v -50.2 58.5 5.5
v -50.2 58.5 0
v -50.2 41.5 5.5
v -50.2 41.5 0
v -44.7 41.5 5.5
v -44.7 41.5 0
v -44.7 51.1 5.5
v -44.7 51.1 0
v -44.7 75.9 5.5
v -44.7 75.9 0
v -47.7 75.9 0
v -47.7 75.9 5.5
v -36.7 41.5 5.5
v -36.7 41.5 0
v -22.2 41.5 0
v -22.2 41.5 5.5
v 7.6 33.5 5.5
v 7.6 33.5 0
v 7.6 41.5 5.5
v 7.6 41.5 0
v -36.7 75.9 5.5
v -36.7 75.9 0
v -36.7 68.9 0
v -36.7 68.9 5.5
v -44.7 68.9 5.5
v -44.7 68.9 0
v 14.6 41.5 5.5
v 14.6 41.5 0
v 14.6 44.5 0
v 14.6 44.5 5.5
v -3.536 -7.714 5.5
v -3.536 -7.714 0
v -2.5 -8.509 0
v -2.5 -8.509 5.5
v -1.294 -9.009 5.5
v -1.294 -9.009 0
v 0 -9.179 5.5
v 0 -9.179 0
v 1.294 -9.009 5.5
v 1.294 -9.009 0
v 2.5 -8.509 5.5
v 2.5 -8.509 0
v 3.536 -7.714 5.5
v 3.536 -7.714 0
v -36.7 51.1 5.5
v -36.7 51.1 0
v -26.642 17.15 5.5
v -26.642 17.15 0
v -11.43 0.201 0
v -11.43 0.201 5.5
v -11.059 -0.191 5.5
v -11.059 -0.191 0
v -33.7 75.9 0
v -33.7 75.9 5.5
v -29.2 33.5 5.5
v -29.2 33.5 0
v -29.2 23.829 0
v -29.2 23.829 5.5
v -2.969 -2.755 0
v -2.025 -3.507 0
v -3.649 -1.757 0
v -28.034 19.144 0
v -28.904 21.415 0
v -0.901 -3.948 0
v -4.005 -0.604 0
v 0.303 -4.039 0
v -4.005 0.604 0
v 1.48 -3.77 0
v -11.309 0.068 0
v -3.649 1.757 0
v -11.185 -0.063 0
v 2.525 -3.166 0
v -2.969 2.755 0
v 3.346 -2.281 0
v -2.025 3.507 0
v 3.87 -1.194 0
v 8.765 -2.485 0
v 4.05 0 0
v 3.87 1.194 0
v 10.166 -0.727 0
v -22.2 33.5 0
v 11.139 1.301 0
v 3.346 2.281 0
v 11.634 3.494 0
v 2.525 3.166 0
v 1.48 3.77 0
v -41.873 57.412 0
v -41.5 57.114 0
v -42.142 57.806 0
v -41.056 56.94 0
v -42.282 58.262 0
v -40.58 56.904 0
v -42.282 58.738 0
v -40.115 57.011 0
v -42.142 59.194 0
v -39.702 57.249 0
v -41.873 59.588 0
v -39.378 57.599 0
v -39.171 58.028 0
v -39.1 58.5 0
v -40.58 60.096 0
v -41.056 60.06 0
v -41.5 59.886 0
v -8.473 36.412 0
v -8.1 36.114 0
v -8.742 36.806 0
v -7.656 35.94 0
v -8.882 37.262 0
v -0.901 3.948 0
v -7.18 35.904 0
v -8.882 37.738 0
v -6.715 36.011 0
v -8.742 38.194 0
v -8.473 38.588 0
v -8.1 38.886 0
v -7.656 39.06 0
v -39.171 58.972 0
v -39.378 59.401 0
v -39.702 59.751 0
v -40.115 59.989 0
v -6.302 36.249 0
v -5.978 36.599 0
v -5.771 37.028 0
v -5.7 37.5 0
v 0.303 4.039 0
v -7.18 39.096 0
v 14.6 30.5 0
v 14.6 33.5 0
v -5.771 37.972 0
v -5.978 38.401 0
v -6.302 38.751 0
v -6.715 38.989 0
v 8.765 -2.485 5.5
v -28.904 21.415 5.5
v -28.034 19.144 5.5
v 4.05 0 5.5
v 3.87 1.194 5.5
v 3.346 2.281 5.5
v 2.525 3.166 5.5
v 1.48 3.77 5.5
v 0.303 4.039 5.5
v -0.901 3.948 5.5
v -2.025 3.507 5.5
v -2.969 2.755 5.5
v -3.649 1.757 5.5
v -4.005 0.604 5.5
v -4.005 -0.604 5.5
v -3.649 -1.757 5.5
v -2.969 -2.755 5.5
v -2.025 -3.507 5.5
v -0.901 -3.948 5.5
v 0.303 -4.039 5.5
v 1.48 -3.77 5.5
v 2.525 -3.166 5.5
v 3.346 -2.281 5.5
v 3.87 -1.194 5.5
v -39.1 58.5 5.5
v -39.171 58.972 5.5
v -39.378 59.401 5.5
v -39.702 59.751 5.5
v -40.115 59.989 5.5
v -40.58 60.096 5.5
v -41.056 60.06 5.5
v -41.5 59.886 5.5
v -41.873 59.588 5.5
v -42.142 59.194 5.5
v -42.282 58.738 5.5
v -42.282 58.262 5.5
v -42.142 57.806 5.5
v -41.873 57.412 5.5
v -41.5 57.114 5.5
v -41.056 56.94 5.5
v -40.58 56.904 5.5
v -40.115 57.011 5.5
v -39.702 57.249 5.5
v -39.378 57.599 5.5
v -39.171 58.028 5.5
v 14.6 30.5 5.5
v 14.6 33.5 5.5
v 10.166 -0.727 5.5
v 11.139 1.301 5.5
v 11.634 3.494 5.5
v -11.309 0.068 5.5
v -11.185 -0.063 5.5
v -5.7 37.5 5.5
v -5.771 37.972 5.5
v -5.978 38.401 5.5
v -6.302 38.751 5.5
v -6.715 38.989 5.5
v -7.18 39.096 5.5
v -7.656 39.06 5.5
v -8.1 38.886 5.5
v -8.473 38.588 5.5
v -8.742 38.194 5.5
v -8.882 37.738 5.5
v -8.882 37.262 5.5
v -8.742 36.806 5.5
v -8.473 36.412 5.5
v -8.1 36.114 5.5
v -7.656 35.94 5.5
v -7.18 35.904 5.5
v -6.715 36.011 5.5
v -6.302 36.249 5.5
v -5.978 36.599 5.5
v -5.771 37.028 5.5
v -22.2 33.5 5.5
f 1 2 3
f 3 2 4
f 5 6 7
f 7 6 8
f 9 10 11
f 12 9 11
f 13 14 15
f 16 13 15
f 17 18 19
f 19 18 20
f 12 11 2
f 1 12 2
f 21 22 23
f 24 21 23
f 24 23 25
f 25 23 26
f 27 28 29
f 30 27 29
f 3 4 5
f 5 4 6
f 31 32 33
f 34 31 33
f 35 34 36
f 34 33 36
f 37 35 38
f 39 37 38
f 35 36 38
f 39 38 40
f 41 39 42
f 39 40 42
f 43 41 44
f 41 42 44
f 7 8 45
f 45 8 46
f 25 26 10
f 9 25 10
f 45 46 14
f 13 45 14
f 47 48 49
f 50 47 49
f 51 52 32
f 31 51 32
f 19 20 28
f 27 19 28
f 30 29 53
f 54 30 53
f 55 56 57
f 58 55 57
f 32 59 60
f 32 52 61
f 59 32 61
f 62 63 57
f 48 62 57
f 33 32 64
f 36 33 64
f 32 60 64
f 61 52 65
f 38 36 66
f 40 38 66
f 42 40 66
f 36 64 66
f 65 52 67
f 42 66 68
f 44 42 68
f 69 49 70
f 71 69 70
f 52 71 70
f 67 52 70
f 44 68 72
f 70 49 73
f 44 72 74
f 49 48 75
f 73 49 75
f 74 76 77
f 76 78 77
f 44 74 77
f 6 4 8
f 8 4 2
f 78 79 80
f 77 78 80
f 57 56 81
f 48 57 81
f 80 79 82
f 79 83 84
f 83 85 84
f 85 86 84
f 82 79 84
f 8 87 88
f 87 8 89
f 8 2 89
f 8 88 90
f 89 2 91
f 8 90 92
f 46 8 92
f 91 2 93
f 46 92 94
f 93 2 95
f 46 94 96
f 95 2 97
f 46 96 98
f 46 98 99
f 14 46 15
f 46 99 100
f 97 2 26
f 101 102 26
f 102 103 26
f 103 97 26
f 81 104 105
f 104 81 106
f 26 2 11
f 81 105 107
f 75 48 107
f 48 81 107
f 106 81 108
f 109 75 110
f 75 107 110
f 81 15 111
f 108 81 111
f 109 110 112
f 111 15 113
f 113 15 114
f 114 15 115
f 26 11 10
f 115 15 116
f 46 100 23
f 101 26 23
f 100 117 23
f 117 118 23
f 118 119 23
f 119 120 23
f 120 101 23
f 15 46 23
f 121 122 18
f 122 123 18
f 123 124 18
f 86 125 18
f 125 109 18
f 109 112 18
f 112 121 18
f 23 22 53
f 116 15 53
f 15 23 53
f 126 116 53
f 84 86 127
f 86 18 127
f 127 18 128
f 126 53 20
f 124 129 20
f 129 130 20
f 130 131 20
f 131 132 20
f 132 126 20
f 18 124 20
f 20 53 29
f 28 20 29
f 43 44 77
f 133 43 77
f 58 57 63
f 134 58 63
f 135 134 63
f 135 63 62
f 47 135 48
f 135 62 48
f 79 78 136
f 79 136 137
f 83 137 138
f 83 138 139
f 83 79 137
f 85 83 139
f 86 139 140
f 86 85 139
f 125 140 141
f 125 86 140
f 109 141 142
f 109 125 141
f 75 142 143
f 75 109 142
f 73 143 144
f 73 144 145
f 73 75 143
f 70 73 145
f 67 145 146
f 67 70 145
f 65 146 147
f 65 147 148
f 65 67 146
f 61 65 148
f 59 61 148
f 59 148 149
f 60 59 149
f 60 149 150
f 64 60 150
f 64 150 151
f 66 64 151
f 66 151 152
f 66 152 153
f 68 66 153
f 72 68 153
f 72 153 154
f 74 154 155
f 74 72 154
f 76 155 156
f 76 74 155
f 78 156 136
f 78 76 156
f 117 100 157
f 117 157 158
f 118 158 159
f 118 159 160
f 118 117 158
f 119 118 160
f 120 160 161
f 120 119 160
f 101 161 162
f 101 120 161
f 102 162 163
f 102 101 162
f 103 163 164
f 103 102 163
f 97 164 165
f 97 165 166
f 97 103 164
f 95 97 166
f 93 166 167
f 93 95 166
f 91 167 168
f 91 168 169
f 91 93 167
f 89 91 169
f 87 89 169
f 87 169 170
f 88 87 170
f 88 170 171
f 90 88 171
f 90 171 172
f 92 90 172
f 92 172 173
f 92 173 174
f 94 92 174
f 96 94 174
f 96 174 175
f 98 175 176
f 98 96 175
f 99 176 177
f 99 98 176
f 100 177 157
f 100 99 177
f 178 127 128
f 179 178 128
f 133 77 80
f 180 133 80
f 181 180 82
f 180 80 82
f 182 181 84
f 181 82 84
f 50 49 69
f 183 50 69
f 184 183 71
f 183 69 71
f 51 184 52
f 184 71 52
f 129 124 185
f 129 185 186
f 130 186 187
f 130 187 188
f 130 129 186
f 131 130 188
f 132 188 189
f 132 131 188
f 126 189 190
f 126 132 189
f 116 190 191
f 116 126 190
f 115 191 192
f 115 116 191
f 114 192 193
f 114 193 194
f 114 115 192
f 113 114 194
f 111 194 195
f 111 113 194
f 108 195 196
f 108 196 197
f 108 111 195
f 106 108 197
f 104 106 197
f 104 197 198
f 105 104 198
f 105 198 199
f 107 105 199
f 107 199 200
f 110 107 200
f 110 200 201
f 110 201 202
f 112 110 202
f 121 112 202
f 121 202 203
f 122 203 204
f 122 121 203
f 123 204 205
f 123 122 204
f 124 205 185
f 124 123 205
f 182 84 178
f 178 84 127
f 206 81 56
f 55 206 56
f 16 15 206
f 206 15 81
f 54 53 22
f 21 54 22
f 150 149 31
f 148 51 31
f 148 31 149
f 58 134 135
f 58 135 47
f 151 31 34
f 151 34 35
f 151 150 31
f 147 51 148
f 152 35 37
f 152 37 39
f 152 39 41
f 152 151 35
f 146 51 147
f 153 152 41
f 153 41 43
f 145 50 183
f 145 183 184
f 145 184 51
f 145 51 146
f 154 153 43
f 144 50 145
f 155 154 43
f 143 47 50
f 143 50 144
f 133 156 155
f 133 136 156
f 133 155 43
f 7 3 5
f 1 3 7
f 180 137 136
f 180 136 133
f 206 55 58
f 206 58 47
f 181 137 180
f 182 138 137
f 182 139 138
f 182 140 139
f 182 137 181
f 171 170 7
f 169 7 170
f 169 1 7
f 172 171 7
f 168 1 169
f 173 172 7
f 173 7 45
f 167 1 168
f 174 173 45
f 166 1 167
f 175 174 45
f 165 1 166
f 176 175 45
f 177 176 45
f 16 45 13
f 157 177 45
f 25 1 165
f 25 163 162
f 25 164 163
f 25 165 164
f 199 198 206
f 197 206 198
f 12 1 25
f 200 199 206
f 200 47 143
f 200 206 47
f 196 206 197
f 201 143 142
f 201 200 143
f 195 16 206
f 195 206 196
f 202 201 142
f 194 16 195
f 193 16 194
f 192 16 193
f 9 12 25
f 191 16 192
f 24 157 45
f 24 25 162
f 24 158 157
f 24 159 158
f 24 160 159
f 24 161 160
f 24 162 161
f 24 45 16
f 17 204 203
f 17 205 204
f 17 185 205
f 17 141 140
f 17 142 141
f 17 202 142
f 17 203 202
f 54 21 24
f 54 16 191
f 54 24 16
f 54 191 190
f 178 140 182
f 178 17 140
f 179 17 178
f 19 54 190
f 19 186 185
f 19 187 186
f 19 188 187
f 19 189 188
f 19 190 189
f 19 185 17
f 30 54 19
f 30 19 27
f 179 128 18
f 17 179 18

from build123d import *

# Parameters (mm, degrees)
F0_R     = 4.05
F0_R_2   = 1.6
F1_DEPTH = 5.5


with BuildPart() as f1:
    # F0 (on Top) → F1 (new body)
    with BuildSketch(Plane.XY):
        with BuildLine():
            Line((-22.2, 41.5), (-22.2, 37.5))
            Line((-22.2, 37.5), (-22.2, 33.5))
            Line((-22.2, 33.5), (-29.2, 33.5))
            Line((-29.2, 33.5), (-29.2, 23.829429))
            ThreePointArc((-29.2, 23.829429), (-28.538679, 20.253248), (-26.642186, 17.150068))
            Line((-26.642186, 17.150068), (-11.430273, 0.200861))
            ThreePointArc((-11.430273, 0.200861), (-11.247357, 0.002505), (-11.059155, -0.190845))
            Line((-11.059155, -0.190845), (-3.535534, -7.714466))
            ThreePointArc((-3.535534, -7.714466), (0, -9.178932), (3.535534, -7.714466))
            Line((3.535534, -7.714466), (8.764601, -2.485399))
            ThreePointArc((8.764601, -2.485399), (10.709292, 0.259459), (11.633753, 3.493874))
            Line((11.633753, 3.493874), (14.6, 30.5))
            Line((14.6, 30.5), (14.6, 33.5))
            Line((14.6, 33.5), (7.6, 33.5))
            Line((7.6, 33.5), (7.6, 37.5))
            Line((7.6, 37.5), (7.6, 41.5))
            Line((7.6, 41.5), (14.6, 41.5))
            Line((14.6, 41.5), (14.6, 44.5))
            Line((14.6, 44.5), (-33.7, 75.9))
            Line((-33.7, 75.9), (-36.7, 75.9))
            Line((-36.7, 75.9), (-36.7, 68.9))
            Line((-36.7, 68.9), (-40.7, 68.9))
            Line((-40.7, 68.9), (-44.7, 68.9))
            Line((-44.7, 68.9), (-44.7, 75.9))
            Line((-44.7, 75.9), (-47.7, 75.9))
            Line((-47.7, 75.9), (-50.2, 58.5))
            Line((-50.2, 58.5), (-50.2, 41.5))
            Line((-50.2, 41.5), (-44.7, 41.5))
            Line((-44.7, 41.5), (-44.7, 51.1))
            Line((-44.7, 51.1), (-40.7, 51.1))
            Line((-40.7, 51.1), (-36.7, 51.1))
            Line((-36.7, 51.1), (-36.7, 41.5))
            Line((-36.7, 41.5), (-22.2, 41.5))
        make_face()
        Circle(F0_R, mode=Mode.SUBTRACT)
        with Locations((-40.7, 58.5)):
            Circle(F0_R_2, mode=Mode.SUBTRACT)
        with Locations((-7.3, 37.5)):
            Circle(F0_R_2, mode=Mode.SUBTRACT)
    extrude(amount=F1_DEPTH)


solid = f1.part
